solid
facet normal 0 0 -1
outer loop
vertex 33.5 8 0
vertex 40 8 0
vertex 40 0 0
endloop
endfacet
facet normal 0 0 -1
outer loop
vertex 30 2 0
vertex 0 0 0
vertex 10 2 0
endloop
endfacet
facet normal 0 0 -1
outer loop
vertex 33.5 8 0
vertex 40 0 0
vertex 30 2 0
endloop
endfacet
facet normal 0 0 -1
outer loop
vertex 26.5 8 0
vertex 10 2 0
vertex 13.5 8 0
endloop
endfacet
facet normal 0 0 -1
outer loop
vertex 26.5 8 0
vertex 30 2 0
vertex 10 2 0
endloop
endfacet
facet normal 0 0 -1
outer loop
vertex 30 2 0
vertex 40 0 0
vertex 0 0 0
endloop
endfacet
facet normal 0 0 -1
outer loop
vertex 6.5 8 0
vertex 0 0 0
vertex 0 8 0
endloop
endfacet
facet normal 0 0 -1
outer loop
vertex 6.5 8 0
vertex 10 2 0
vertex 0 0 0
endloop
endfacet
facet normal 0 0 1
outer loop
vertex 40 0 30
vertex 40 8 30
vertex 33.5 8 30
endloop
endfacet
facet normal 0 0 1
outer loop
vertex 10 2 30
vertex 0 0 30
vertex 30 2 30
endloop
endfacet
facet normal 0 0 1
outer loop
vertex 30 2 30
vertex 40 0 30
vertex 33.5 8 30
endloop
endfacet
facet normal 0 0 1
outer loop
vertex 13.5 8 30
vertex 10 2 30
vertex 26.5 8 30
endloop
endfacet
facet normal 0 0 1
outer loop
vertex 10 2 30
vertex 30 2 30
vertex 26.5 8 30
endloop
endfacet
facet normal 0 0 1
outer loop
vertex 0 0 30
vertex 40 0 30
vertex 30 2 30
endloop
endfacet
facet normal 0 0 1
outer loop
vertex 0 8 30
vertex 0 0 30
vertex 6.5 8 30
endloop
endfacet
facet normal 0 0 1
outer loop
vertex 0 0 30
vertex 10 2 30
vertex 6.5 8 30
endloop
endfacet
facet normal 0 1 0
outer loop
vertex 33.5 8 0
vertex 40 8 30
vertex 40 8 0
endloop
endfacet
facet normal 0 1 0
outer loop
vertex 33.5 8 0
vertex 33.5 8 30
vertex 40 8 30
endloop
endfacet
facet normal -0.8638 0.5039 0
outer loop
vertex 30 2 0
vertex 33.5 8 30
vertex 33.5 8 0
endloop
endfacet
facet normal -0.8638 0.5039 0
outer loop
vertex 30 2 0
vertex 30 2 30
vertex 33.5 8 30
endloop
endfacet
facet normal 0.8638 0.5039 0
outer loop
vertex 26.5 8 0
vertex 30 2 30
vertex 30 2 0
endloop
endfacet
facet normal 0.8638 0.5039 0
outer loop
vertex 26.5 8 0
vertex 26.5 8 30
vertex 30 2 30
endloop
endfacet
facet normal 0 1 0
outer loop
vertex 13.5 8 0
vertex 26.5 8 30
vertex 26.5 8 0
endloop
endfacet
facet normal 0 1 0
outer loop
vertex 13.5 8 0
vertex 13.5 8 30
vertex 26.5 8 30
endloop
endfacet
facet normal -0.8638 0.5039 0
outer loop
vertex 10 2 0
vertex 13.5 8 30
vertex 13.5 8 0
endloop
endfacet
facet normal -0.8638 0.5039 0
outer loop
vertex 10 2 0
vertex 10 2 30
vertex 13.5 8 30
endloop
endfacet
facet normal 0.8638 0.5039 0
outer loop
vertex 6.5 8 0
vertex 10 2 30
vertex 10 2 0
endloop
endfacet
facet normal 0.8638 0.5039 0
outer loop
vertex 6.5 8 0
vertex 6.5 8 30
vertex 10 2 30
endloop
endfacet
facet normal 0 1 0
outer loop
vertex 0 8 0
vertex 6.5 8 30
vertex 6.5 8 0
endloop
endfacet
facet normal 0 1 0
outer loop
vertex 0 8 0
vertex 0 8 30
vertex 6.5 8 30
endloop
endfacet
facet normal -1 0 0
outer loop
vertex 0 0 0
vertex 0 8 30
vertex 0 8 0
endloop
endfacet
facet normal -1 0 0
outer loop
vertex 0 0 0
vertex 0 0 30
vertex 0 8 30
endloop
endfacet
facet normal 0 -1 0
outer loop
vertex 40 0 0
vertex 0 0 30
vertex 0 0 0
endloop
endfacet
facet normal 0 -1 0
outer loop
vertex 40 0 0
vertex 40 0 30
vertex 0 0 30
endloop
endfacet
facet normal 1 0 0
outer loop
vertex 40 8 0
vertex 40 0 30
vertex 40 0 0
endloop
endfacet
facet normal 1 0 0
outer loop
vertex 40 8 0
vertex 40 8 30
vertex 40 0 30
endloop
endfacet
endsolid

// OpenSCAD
$fn = 32;

// ----------------------------------------------------------------------
// V guide rail: doublev, 40 mm wide
// ----------------------------------------------------------------------

// --- parameters (mm) ---
rail_w = 40;              // rail width, X
base_t = 8;               // base plate thickness
v_depth = 6;              // V feature depth / height
v_half_w = 7;             // half width of the V at the base face
plate_t = 30;             // rail length, Z (the extrusion height)
groove_off = 10;          // offset of each groove from the centreline

centre_x = rail_w / 2;  // rail centreline
groove_a = centre_x - groove_off;  // axis of the first groove
groove_b = centre_x + groove_off;  // axis of the second groove

profile = [[0, 0], [40, 0], [40, 8], [33.5, 8], [30, 2], [26.5, 8], [13.5, 8], [10, 2], [6.5, 8], [0, 8]];  // primary outline, 10 points, counter clockwise

// --- the one profile operation ---
linear_extrude(height = plate_t) polygon(points = profile);
